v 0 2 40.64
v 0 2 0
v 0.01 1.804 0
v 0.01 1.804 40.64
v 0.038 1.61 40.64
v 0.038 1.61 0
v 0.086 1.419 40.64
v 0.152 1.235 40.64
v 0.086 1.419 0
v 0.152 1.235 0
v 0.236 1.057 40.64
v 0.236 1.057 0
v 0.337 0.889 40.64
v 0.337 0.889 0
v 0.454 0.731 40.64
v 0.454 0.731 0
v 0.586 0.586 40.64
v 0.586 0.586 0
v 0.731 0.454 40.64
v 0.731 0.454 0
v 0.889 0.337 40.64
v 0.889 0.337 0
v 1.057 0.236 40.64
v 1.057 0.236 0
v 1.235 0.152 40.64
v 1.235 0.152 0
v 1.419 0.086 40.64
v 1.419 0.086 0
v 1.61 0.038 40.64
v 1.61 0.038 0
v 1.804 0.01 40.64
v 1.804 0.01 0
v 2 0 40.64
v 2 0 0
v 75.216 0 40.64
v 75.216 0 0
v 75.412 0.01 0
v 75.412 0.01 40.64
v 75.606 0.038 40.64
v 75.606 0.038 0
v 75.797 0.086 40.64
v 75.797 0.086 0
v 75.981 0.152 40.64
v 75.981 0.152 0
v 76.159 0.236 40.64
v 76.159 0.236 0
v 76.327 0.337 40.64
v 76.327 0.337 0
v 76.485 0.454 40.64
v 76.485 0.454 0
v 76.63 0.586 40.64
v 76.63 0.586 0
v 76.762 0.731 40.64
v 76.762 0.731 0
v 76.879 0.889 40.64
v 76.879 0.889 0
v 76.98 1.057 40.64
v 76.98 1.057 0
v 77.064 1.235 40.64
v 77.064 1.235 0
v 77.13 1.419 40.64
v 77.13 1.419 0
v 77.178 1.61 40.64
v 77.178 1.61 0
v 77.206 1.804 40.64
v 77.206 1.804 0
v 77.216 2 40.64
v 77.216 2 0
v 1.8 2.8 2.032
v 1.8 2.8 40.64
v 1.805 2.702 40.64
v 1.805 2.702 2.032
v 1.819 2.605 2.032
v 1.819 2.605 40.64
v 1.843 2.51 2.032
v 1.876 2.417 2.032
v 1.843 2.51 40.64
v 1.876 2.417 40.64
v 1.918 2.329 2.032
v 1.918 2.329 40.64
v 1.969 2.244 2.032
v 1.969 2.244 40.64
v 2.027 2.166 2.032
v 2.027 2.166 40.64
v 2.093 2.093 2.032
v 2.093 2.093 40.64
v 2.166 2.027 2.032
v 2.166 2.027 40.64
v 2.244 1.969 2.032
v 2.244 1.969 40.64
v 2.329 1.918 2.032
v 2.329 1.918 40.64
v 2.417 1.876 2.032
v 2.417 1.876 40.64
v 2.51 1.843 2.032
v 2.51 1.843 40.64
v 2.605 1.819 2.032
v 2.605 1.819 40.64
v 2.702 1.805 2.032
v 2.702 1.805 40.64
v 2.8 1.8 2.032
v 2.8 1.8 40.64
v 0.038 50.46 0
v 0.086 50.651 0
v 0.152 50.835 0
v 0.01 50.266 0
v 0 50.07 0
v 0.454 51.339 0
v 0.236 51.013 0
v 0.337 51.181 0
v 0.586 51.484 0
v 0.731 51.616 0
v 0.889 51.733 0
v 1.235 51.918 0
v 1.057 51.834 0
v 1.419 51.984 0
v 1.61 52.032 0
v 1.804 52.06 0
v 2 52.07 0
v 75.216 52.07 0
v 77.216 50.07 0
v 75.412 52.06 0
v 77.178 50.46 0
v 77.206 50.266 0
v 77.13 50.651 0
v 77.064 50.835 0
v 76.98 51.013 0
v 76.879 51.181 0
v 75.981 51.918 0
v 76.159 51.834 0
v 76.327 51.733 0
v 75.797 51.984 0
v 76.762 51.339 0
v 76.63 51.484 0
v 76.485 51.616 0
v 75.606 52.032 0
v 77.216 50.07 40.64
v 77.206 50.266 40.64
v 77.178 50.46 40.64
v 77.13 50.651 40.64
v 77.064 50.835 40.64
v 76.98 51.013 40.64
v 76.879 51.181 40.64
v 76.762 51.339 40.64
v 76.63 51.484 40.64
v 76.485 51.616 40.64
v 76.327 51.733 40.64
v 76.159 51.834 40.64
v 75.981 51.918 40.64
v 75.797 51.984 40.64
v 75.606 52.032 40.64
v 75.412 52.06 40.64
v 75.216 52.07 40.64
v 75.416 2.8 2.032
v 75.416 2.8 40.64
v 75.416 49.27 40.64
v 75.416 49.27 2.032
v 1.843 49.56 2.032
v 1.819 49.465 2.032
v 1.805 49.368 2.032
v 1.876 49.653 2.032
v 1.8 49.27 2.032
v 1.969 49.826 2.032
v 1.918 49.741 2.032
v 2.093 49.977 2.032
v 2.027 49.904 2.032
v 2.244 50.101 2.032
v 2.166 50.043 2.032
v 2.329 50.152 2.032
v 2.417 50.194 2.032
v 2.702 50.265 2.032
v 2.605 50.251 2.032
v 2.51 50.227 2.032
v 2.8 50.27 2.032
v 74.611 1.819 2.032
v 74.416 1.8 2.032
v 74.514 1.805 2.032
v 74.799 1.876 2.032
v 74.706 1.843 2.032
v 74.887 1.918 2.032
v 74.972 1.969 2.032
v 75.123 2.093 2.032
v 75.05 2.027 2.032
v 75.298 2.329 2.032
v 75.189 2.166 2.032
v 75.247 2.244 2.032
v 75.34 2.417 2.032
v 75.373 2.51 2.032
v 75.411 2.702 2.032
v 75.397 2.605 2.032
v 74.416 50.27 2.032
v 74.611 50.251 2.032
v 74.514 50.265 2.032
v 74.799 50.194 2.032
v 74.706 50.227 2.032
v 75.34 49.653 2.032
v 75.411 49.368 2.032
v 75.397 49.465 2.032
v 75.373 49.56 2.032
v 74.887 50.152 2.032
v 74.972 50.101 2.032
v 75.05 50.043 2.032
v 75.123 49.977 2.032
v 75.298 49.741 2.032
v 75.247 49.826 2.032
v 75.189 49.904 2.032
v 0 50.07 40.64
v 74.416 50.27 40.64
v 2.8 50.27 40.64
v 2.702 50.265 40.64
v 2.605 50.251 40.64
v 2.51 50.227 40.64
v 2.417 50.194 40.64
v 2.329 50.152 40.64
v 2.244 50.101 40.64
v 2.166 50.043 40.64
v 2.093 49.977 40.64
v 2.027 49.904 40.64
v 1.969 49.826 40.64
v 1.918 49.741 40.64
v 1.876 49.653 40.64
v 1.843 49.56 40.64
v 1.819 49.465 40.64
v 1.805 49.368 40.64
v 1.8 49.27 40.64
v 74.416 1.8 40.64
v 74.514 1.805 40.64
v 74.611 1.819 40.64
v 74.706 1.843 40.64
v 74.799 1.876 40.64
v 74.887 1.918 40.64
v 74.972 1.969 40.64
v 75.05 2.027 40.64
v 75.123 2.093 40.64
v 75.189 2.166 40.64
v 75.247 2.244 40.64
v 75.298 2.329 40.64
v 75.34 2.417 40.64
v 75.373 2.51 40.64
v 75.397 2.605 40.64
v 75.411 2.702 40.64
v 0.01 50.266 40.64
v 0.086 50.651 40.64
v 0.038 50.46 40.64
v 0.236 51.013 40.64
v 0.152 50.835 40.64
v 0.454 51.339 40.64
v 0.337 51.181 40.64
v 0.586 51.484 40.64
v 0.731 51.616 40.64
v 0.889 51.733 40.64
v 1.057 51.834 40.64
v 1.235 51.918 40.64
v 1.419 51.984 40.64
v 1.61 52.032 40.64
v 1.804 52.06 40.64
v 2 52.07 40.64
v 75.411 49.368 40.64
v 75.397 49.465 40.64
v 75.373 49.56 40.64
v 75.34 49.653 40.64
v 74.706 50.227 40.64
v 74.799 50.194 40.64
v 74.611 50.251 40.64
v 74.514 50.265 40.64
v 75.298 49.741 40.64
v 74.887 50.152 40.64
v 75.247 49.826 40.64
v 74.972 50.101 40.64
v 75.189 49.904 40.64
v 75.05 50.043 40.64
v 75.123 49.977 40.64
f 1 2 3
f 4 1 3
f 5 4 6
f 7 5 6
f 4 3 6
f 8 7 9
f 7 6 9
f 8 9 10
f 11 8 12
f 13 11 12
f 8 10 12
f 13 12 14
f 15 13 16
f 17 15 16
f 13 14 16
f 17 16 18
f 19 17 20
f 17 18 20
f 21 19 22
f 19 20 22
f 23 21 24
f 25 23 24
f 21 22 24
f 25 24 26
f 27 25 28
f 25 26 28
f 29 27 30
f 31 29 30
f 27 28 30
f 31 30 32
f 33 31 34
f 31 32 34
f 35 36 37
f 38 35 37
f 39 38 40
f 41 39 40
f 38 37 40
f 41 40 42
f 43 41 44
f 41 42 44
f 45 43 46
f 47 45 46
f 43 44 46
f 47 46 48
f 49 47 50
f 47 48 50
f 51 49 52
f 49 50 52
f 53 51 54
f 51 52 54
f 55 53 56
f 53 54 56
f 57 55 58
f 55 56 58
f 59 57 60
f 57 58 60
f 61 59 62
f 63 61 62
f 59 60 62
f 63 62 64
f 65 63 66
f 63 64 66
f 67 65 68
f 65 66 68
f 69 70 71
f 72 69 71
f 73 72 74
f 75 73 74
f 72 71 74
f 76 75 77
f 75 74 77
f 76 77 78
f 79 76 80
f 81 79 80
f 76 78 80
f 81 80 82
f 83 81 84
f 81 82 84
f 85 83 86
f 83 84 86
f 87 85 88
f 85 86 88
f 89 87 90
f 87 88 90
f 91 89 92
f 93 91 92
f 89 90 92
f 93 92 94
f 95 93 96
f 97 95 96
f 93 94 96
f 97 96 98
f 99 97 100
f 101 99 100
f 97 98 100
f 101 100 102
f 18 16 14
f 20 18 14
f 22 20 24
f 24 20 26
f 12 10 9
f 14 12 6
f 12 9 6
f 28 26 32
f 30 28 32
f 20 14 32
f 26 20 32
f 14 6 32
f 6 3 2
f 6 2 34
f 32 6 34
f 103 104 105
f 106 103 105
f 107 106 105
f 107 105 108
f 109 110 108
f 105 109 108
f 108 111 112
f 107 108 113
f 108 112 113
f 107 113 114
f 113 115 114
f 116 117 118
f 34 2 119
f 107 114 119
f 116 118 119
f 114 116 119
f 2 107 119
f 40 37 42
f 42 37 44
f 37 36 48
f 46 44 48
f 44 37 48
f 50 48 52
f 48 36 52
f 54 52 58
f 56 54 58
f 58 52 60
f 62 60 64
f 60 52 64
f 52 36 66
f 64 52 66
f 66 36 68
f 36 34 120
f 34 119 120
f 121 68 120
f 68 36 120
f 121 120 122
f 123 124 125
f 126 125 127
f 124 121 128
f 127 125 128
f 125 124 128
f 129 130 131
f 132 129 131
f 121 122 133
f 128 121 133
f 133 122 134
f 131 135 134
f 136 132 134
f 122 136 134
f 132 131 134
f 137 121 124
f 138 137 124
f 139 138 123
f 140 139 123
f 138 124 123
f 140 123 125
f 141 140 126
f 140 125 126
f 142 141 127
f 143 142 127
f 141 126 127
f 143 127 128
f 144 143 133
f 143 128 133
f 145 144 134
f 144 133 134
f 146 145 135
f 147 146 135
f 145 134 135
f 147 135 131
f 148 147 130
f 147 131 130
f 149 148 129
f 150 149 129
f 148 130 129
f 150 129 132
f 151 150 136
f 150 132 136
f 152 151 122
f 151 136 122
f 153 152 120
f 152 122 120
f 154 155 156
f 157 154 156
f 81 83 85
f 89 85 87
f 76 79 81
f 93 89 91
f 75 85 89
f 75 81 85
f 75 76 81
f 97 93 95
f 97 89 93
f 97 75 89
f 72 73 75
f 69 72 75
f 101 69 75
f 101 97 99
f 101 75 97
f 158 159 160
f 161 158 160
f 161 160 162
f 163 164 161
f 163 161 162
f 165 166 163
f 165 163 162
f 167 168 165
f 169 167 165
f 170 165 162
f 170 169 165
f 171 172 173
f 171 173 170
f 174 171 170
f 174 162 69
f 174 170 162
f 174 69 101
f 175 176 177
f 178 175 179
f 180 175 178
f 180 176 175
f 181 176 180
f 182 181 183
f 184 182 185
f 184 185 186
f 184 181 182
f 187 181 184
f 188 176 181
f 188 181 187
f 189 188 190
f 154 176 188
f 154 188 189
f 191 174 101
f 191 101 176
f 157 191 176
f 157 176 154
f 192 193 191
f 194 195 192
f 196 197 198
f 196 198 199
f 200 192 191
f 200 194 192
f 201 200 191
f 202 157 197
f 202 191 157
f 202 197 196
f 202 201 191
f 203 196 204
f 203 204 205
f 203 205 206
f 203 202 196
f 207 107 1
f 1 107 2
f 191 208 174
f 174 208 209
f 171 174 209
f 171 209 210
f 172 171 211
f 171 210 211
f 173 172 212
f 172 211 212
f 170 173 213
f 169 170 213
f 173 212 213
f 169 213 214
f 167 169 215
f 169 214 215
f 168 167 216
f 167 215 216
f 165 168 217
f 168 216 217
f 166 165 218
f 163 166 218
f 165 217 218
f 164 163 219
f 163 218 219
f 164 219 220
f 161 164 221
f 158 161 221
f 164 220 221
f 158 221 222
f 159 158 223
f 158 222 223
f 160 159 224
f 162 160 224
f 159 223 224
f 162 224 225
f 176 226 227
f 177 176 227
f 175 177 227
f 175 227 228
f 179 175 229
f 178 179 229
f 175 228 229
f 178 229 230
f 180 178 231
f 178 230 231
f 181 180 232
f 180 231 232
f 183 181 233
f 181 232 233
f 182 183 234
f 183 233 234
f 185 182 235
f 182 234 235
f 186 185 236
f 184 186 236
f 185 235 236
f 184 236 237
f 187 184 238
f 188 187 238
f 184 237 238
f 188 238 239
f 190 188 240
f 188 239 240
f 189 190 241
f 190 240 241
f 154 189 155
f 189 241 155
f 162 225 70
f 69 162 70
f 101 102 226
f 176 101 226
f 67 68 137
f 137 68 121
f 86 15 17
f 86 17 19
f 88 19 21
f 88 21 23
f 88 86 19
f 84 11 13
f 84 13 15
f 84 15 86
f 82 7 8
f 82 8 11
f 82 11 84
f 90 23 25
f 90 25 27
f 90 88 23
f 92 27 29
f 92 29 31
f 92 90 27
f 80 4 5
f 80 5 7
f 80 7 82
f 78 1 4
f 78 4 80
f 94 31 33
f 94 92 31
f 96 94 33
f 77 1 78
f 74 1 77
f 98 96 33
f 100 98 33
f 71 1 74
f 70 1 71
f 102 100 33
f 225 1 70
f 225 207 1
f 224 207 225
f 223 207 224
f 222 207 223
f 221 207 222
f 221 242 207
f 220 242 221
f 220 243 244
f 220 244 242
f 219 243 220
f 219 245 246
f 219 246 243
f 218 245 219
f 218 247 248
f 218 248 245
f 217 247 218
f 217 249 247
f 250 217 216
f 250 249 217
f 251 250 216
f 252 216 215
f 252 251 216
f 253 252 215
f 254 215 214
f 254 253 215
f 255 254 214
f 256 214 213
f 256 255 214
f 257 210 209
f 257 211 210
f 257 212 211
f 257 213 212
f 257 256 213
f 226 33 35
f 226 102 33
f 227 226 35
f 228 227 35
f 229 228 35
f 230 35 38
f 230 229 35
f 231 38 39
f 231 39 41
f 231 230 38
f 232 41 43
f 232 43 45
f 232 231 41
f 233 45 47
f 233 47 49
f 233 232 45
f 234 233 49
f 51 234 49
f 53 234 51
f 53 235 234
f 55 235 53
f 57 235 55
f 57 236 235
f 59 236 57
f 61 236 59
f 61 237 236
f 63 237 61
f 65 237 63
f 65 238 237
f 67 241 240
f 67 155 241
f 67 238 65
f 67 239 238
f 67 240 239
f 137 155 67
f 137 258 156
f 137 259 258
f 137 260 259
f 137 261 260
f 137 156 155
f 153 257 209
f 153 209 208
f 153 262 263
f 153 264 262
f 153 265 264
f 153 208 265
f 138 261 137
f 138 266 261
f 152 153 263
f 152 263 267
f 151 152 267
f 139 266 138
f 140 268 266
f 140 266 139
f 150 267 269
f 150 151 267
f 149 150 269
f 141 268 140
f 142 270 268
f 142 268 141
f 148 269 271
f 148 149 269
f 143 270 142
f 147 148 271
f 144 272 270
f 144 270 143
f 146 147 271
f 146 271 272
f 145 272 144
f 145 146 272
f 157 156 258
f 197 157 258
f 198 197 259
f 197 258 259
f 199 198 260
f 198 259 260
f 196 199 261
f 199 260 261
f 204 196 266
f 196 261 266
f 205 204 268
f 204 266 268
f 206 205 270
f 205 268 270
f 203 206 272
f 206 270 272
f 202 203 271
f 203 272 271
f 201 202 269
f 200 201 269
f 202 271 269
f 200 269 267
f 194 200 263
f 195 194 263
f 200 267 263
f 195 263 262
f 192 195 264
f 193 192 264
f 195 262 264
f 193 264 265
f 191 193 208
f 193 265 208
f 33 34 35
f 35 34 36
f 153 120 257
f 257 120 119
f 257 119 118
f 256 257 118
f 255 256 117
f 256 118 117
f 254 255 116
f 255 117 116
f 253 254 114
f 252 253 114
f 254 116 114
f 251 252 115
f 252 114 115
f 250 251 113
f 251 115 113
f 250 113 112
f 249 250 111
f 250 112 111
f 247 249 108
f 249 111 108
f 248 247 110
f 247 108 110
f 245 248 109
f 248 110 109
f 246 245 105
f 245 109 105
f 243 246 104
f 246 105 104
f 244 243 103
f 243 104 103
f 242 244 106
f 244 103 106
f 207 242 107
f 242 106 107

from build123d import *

# Parameters (mm, degrees)
F1_DEPTH = 40.64
F3_DEPTH = 38.608


# Not quite as in the source:
# - a feature names something its author has since deleted; it is built from what else it names


with BuildPart() as f1:
    # F0 (on Top) → F1 (new body)
    with BuildSketch(Plane.XY):
        with BuildLine():
            ThreePointArc((0, 2), (0.5857864376, 0.5857864376), (2, 0))
            Line((2, 0), (75.216, 0))
            ThreePointArc((75.216, 0), (76.6302135624, 0.5857864376), (77.216, 2))
            Line((77.216, 2), (77.216, 50.07))
            ThreePointArc((77.216, 50.07), (76.6302135624, 51.4842135624), (75.216, 52.07))
            Line((75.216, 52.07), (2, 52.07))
            ThreePointArc((2, 52.07), (0.5857864376, 51.4842135624), (0, 50.07))
            Line((0, 50.07), (0, 2))
        make_face()
    extrude(amount=F1_DEPTH)

    # F2 (on face) → F3 (cut)
    with BuildSketch(Plane.XY.offset(40.64)):
        with BuildLine():
            Line((74.416, 50.27), (2.8, 50.27))
            ThreePointArc((2.8, 50.27), (2.0928932188, 49.9771067812), (1.8, 49.27))
            Line((1.8, 49.27), (1.8, 2.8))
            ThreePointArc((1.8, 2.8), (2.0928932188, 2.0928932188), (2.8, 1.8))
            Line((2.8, 1.8), (74.416, 1.8))
            ThreePointArc((74.416, 1.8), (75.1231067812, 2.0928932188), (75.416, 2.8))
            Line((75.416, 2.8), (75.416, 49.27))
            ThreePointArc((75.416, 49.27), (75.1231067812, 49.9771067812), (74.416, 50.27))
        make_face()
    extrude(amount=-F3_DEPTH, mode=Mode.SUBTRACT)


solid = f1.part
